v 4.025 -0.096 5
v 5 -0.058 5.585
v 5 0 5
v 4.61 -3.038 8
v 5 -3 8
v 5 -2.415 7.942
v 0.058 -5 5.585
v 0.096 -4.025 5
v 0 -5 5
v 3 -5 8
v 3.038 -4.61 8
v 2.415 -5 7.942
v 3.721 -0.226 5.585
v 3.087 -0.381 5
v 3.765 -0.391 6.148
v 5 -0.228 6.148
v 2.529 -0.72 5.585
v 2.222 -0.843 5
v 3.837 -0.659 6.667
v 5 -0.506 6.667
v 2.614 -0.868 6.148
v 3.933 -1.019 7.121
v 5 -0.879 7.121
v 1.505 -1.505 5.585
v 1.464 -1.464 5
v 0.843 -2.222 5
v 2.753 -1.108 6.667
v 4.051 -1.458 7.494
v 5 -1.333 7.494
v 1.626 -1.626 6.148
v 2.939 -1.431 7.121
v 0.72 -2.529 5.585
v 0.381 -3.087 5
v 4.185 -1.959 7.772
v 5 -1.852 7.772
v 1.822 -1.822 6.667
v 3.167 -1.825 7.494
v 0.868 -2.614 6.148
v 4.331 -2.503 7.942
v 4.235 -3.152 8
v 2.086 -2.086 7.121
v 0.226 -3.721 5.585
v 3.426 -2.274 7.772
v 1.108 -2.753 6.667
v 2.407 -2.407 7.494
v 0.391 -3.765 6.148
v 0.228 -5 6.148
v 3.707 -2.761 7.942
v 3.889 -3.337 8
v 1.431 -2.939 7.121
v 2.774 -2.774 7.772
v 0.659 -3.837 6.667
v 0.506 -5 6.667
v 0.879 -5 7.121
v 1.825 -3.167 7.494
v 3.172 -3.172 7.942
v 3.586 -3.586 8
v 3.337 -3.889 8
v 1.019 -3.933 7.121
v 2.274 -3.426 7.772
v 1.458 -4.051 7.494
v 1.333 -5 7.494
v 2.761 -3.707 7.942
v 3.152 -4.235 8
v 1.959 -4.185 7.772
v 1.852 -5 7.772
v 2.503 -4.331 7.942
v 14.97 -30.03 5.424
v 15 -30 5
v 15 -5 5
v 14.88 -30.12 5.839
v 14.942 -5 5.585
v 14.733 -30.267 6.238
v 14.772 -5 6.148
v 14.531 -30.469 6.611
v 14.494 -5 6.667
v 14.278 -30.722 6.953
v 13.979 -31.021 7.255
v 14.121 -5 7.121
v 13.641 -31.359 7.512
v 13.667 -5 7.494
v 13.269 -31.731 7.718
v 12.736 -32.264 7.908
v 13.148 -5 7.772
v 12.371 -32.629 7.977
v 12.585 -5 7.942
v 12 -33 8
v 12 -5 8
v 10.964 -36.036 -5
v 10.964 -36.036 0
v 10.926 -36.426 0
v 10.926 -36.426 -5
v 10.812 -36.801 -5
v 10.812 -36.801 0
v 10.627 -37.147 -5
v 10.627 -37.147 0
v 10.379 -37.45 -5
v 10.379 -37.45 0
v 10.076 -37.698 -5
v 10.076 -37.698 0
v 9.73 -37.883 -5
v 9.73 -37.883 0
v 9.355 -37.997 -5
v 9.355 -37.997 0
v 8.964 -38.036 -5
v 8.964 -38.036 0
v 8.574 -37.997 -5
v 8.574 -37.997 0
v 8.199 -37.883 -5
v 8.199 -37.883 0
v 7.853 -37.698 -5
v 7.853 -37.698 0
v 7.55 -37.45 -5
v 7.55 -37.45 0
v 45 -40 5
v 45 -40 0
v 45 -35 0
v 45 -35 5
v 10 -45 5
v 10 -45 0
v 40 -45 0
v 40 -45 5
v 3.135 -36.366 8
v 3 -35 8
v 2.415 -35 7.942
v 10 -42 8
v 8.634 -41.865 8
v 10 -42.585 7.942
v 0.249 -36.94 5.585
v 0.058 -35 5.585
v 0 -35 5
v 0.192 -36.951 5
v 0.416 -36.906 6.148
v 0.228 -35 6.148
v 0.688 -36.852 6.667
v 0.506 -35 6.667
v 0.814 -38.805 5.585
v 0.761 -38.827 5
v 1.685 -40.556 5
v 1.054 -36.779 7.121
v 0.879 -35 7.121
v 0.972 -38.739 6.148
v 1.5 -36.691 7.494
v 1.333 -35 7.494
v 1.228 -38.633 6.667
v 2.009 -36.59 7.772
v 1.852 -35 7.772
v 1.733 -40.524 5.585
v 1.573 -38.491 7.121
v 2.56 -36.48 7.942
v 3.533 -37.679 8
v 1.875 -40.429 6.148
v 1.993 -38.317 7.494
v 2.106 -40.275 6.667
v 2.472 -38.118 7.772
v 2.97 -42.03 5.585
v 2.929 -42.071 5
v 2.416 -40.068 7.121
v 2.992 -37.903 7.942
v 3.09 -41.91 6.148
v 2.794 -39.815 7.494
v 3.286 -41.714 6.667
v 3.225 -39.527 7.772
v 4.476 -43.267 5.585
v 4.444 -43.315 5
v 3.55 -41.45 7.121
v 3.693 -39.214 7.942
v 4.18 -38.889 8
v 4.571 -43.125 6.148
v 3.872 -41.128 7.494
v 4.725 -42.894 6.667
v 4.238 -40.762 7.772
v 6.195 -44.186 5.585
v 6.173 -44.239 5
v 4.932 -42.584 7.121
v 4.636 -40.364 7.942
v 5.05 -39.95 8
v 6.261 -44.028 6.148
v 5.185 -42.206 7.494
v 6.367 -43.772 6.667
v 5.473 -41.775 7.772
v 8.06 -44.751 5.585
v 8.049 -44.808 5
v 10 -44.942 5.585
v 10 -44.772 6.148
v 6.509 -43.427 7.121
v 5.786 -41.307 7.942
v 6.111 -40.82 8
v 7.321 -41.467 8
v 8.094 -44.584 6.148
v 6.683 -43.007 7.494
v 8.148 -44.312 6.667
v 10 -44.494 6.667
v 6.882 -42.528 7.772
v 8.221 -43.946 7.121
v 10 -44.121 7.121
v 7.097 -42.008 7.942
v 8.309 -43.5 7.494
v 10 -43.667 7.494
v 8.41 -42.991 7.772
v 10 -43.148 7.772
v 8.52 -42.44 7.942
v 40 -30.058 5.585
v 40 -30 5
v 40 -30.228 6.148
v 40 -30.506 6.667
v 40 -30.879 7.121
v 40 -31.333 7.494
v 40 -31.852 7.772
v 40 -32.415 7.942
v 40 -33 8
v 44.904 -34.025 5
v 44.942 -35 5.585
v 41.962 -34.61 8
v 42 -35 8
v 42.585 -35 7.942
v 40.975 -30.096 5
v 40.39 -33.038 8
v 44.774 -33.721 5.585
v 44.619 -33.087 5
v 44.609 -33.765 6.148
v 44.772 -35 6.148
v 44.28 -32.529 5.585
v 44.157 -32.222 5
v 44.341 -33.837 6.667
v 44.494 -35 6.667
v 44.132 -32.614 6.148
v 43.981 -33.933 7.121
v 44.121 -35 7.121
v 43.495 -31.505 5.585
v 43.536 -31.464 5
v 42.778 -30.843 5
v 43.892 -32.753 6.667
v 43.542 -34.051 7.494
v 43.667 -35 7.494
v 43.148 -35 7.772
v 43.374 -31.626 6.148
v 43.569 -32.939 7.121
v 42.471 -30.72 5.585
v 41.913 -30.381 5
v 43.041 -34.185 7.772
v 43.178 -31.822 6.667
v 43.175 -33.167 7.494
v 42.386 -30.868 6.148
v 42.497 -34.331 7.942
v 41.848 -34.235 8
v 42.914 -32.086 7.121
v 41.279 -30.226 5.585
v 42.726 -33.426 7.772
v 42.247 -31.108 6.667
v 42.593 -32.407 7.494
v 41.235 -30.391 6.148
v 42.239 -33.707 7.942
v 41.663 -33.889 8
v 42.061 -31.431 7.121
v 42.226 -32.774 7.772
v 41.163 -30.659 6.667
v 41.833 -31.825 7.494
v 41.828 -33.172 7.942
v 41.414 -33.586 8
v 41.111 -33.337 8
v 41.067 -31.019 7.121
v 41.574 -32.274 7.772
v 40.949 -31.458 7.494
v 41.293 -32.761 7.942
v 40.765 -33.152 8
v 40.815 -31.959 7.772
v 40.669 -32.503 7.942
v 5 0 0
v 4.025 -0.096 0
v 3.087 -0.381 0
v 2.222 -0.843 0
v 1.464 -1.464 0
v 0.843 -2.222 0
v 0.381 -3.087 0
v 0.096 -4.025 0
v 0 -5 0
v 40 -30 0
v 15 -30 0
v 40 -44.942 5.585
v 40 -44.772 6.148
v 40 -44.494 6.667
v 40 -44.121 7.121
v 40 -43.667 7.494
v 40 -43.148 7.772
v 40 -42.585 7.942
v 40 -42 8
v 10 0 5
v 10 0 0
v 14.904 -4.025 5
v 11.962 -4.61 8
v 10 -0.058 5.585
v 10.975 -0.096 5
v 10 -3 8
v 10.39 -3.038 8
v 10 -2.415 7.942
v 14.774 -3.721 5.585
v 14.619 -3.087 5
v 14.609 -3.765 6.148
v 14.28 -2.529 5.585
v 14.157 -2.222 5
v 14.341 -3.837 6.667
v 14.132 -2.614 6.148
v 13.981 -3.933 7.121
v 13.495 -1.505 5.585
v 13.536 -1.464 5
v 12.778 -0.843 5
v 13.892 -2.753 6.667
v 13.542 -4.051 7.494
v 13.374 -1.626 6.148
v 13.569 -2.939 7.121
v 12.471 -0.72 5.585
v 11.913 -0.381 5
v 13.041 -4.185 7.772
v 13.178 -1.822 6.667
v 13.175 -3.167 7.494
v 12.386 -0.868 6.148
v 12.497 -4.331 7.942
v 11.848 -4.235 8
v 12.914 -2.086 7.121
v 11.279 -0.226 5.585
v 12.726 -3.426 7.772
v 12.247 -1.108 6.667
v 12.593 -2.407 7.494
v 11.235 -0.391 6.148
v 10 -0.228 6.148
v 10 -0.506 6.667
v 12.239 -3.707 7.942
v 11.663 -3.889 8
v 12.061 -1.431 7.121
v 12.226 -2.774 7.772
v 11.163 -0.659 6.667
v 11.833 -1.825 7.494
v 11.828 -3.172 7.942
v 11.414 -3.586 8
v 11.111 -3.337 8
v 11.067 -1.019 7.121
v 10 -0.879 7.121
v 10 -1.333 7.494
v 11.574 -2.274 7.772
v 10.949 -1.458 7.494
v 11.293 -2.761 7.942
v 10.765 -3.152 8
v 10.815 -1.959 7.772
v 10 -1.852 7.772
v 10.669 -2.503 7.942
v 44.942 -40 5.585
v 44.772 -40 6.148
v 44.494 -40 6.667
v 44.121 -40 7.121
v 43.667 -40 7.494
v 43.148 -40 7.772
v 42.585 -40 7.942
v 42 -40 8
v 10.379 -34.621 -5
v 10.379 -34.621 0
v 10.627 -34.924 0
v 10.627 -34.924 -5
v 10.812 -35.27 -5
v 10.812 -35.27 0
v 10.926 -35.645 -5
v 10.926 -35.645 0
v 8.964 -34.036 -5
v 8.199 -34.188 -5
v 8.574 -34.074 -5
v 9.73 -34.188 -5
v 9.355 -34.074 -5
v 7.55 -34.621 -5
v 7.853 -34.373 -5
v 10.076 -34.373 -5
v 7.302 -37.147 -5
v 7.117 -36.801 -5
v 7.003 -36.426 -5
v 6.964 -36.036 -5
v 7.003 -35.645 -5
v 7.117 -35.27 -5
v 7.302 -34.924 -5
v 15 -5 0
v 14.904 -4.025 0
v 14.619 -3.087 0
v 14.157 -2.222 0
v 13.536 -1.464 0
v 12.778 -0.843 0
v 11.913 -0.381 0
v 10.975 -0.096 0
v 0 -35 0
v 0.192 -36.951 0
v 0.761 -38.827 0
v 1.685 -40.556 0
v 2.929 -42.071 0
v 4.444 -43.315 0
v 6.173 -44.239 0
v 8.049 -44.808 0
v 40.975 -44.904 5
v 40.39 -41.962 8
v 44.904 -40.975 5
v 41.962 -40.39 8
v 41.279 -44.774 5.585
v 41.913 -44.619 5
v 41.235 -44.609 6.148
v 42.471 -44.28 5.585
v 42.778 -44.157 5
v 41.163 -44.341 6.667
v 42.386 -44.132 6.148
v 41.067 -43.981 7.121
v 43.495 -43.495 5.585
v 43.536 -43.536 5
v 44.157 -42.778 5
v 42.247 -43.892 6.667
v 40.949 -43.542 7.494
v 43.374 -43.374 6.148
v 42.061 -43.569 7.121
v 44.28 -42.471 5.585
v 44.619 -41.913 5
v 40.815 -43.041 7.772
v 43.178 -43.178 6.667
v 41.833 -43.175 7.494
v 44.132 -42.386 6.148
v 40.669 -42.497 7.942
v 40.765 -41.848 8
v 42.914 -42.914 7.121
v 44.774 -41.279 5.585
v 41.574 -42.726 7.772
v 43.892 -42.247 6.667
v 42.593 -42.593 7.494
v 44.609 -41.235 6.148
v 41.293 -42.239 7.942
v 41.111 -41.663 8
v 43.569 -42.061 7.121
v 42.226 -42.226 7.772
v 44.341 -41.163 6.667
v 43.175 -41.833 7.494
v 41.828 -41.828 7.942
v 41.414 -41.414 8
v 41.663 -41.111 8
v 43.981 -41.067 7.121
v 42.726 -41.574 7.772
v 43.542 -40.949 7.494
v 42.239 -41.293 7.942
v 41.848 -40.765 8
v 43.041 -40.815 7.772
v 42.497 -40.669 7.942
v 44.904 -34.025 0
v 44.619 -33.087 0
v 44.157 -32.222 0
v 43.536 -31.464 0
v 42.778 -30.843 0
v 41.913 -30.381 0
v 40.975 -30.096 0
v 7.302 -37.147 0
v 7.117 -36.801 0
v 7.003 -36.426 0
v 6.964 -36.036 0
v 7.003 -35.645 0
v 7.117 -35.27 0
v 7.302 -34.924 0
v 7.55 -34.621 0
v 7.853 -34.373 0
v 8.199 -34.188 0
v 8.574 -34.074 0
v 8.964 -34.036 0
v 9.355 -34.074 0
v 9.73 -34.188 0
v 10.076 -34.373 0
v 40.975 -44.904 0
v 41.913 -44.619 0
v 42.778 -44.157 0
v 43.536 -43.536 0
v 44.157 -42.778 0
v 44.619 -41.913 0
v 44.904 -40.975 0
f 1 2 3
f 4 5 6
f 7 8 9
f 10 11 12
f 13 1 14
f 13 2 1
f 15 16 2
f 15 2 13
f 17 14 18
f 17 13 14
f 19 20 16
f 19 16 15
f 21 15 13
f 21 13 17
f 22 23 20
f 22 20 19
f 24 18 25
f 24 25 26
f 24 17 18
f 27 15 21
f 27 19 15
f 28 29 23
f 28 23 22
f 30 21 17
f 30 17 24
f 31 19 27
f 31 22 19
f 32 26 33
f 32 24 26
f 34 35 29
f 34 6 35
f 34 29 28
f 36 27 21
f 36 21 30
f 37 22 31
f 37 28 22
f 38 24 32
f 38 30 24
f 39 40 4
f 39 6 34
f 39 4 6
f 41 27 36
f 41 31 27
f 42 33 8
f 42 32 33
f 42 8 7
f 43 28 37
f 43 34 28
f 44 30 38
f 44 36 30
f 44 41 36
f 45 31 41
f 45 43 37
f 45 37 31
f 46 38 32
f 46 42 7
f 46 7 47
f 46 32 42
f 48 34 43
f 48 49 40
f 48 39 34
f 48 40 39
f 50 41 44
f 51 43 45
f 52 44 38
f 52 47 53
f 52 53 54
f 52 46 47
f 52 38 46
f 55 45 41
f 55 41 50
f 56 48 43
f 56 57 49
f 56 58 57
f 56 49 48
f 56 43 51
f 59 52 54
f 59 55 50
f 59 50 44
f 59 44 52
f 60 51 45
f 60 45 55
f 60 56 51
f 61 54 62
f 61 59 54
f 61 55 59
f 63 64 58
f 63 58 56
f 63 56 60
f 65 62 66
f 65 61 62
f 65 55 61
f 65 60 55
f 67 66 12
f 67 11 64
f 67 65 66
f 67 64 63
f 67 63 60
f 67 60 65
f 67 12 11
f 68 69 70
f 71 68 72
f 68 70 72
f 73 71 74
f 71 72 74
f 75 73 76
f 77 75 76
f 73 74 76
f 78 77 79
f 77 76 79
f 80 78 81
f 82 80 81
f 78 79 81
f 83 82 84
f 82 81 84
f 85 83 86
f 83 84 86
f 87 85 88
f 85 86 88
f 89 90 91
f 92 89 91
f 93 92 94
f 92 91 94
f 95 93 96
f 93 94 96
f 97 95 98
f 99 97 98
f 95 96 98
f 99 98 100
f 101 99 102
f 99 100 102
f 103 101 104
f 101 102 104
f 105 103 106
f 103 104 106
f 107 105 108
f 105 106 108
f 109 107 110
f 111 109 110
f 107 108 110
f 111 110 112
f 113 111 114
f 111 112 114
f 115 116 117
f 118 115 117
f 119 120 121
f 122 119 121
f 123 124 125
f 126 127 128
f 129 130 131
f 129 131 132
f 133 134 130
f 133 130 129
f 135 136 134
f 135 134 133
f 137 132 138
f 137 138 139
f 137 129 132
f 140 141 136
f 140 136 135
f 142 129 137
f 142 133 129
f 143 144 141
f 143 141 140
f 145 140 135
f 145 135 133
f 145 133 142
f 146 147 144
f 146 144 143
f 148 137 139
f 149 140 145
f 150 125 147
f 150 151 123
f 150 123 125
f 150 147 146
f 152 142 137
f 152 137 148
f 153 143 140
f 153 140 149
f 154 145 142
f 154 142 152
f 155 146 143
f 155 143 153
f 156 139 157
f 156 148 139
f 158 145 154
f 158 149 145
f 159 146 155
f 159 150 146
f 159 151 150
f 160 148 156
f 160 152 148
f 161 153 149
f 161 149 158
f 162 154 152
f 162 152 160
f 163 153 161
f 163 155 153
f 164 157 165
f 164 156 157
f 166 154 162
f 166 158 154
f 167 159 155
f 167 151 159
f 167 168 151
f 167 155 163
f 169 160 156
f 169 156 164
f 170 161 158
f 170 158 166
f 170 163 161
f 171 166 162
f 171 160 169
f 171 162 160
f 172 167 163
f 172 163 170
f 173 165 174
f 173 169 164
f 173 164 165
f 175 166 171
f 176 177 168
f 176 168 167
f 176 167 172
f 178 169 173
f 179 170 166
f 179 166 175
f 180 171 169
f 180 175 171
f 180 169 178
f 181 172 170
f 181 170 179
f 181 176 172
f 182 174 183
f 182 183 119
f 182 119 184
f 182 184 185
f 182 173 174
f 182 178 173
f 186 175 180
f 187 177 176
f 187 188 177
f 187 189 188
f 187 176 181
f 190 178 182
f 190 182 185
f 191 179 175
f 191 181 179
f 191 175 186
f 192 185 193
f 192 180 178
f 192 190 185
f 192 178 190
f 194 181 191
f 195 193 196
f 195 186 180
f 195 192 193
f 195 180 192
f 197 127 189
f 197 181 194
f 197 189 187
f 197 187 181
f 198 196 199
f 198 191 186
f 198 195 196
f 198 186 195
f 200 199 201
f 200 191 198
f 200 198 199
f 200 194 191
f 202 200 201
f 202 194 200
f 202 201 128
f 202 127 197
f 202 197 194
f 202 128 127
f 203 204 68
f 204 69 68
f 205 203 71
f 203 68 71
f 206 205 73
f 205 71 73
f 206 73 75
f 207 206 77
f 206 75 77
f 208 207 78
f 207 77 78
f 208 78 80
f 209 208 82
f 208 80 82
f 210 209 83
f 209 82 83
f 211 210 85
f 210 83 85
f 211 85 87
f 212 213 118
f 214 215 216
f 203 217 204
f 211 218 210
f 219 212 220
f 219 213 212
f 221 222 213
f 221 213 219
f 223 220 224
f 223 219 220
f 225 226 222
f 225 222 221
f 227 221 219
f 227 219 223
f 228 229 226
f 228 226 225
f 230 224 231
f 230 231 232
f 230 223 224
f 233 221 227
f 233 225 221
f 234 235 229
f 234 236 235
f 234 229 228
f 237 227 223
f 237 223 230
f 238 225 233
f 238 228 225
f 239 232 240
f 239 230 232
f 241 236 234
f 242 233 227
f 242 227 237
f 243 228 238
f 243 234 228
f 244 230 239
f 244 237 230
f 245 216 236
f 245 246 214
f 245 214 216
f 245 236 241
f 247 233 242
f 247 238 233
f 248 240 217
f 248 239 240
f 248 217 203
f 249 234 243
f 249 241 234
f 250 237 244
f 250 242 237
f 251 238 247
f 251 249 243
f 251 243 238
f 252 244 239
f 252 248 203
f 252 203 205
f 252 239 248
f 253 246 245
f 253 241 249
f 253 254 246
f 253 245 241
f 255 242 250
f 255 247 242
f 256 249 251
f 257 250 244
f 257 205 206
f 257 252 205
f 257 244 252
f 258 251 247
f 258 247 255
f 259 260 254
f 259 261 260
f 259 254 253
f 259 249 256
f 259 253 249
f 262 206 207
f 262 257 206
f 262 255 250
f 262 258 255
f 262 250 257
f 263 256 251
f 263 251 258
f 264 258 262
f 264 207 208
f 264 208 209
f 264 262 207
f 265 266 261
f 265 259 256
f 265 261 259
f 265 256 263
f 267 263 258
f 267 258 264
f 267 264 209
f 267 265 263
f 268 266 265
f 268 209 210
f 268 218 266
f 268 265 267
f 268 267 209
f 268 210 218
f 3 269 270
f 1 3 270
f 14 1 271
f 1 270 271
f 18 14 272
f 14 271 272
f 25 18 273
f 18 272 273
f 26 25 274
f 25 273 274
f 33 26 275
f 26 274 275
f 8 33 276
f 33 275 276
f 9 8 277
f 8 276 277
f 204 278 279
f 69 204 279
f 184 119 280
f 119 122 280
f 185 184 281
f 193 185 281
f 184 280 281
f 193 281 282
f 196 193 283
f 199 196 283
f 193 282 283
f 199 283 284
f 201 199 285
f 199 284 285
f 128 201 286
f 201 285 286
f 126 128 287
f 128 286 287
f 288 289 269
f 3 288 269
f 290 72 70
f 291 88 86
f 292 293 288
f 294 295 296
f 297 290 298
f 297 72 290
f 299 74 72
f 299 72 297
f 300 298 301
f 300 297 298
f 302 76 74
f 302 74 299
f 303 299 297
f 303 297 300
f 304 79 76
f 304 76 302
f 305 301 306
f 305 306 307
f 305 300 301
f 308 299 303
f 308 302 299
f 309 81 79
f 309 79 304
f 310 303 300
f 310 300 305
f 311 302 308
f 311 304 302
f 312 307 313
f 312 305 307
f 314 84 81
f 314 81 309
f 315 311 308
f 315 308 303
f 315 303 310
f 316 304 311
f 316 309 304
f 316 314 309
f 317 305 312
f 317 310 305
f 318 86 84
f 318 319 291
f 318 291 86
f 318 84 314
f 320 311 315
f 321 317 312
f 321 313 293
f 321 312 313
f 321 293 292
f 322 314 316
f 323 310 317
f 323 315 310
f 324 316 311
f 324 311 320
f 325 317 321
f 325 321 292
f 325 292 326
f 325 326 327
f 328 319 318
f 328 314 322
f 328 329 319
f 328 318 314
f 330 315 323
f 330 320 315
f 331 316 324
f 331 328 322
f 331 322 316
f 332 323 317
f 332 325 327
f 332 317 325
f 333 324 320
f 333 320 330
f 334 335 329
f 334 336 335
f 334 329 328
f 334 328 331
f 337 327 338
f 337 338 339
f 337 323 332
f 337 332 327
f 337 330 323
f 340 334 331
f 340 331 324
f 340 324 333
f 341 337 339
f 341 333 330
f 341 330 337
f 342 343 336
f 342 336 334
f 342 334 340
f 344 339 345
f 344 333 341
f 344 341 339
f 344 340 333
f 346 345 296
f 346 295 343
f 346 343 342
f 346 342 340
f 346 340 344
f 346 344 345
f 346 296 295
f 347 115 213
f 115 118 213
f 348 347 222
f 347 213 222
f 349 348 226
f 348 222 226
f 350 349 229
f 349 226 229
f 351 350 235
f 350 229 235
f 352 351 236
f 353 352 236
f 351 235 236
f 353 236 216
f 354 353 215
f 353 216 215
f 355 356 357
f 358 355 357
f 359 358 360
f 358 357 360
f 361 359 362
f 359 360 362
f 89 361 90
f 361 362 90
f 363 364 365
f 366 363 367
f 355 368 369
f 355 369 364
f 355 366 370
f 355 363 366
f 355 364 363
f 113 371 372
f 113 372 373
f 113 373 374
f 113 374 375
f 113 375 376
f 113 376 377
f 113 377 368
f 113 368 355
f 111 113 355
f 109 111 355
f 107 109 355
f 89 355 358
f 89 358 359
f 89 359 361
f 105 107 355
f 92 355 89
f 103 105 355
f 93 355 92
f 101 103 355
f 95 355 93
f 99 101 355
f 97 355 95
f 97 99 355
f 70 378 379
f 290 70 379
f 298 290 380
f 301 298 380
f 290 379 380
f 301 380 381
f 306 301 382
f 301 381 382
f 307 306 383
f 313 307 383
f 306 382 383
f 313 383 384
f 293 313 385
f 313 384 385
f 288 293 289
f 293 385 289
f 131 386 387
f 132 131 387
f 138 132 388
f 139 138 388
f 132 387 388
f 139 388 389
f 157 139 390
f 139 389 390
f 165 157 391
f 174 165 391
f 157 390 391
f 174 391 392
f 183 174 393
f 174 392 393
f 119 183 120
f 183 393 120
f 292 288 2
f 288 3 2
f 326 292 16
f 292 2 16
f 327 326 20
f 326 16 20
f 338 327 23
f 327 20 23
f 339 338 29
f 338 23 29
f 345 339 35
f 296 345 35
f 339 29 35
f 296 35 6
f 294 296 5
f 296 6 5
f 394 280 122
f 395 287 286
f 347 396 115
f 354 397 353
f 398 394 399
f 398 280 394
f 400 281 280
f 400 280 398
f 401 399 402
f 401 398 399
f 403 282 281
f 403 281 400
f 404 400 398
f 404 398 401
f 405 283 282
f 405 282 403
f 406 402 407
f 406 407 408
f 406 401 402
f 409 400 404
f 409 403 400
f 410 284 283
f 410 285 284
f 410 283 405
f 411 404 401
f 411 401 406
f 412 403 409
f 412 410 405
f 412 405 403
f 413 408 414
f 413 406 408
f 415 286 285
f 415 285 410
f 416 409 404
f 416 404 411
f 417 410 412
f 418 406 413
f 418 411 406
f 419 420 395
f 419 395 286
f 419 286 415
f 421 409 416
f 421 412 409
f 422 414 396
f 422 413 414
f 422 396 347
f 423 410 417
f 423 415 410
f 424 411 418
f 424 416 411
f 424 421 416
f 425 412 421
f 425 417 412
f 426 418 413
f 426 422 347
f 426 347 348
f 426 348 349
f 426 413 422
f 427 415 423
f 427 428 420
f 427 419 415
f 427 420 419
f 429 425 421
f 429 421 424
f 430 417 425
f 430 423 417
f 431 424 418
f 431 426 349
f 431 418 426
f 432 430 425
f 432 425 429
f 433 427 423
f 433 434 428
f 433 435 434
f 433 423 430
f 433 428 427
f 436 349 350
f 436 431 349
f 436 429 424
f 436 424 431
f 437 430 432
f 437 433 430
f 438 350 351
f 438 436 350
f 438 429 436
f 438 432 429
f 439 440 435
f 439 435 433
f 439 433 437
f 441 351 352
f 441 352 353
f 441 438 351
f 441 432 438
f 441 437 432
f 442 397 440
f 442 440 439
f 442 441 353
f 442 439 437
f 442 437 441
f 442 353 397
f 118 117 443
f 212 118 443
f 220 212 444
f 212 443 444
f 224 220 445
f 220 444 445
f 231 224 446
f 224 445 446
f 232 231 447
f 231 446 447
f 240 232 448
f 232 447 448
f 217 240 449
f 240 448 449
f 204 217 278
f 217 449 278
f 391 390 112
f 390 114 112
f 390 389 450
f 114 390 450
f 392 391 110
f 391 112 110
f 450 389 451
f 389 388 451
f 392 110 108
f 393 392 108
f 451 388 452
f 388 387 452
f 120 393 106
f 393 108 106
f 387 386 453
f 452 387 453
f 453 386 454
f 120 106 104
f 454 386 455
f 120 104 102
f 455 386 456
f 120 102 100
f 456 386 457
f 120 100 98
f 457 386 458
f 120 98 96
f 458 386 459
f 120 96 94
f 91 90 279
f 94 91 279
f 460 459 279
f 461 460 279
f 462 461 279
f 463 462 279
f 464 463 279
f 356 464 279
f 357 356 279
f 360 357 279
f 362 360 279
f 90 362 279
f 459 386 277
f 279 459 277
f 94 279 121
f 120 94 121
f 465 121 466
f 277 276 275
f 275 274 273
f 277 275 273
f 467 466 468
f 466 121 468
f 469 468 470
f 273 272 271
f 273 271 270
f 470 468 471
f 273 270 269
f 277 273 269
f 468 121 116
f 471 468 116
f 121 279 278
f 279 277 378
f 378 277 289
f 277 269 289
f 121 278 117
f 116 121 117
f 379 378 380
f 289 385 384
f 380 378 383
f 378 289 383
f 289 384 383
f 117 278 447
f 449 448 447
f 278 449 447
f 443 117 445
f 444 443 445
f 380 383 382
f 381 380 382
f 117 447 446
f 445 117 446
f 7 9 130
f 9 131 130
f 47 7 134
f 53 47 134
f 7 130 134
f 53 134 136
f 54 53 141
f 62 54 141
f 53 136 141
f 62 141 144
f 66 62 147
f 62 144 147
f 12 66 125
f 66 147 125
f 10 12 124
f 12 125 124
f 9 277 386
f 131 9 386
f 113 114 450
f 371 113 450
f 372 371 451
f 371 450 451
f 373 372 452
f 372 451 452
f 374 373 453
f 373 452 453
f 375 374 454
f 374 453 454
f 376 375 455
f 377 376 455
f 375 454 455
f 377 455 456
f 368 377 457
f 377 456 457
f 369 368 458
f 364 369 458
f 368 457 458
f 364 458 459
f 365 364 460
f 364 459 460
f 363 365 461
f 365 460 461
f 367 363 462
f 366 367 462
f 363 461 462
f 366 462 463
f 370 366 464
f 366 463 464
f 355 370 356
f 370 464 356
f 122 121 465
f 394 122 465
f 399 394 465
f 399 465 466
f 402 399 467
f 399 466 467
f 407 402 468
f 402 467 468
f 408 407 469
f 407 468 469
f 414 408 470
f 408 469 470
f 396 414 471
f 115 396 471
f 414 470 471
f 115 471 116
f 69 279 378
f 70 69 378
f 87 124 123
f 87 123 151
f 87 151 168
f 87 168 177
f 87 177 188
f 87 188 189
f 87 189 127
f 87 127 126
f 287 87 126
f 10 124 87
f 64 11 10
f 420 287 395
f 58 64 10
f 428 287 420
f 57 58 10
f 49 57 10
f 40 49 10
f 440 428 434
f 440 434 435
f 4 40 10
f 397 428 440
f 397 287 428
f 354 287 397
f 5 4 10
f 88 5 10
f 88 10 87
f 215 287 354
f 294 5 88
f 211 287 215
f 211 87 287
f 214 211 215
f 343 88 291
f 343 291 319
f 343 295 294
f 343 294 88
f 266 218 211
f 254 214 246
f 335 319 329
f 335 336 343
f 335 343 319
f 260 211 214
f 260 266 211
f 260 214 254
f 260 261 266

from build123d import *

# Parameters (mm, degrees)
F1_DEPTH = 8
F2_R     = 3
F4_DEPTH = 5


with BuildPart() as f1:
    # F0 (on Top) → F1 (new body)
    with BuildSketch(Plane.XY):
        with BuildLine():
            ThreePointArc((5, 0), (1.4644660941, -1.4644660941), (0, -5))
            Line((0, -5), (0, -35))
            ThreePointArc((0, -35), (2.9289321881, -42.0710678119), (10, -45))
            Line((10, -45), (40, -45))
            ThreePointArc((40, -45), (43.5355339059, -43.5355339059), (45, -40))
            Line((45, -40), (45, -35))
            ThreePointArc((45, -35), (43.5355339059, -31.4644660941), (40, -30))
            Line((40, -30), (15, -30))
            Line((15, -30), (15, -5))
            ThreePointArc((15, -5), (13.5355339059, -1.4644660941), (10, 0))
            Line((10, 0), (5, 0))
        make_face()
    extrude(amount=F1_DEPTH)

    # F2
    f2_edges = [f1.edges().sort_by_distance(p)[0] for p in [
        (15, -17.5, 8),
        (27.5, -30, 8),
        (13.535534, -1.464466, 8),
        (7.5, 0, 8),
        (1.464466, -1.464466, 8),
        (0, -20, 8),
        (2.928932, -42.071068, 8),
        (25, -45, 8),
        (43.535534, -43.535534, 8),
        (45, -37.5, 8),
        (43.535534, -31.464466, 8),
    ]]
    fillet(f2_edges, radius=F2_R)

    # F3 (on face) → F4 (join)
    with BuildSketch(Plane(origin=(0, 0, 0), x_dir=(1, 0, 0), z_dir=(0, 0, -1))):
        with BuildLine():
            ThreePointArc((7.5502525317, 37.4497474683), (7.5502525317, 34.6213203436), (10.3786796564, 34.6213203436))
            Line((10.3786796564, 34.6213203436), (7.5502525317, 37.4497474683))
        make_face()
        with BuildLine():
            Line((7.5502525317, 37.4497474683), (10.3786796564, 34.6213203436))
            ThreePointArc((10.3786796564, 34.6213203436), (10.8122251591, 35.2701670412), (10.9644660941, 36.0355339059))
            ThreePointArc((10.9644660941, 36.0355339059), (9.7298329588, 37.883292971), (7.5502525317, 37.4497474683))
        make_face()
    extrude(amount=F4_DEPTH)


solid = f1.part
